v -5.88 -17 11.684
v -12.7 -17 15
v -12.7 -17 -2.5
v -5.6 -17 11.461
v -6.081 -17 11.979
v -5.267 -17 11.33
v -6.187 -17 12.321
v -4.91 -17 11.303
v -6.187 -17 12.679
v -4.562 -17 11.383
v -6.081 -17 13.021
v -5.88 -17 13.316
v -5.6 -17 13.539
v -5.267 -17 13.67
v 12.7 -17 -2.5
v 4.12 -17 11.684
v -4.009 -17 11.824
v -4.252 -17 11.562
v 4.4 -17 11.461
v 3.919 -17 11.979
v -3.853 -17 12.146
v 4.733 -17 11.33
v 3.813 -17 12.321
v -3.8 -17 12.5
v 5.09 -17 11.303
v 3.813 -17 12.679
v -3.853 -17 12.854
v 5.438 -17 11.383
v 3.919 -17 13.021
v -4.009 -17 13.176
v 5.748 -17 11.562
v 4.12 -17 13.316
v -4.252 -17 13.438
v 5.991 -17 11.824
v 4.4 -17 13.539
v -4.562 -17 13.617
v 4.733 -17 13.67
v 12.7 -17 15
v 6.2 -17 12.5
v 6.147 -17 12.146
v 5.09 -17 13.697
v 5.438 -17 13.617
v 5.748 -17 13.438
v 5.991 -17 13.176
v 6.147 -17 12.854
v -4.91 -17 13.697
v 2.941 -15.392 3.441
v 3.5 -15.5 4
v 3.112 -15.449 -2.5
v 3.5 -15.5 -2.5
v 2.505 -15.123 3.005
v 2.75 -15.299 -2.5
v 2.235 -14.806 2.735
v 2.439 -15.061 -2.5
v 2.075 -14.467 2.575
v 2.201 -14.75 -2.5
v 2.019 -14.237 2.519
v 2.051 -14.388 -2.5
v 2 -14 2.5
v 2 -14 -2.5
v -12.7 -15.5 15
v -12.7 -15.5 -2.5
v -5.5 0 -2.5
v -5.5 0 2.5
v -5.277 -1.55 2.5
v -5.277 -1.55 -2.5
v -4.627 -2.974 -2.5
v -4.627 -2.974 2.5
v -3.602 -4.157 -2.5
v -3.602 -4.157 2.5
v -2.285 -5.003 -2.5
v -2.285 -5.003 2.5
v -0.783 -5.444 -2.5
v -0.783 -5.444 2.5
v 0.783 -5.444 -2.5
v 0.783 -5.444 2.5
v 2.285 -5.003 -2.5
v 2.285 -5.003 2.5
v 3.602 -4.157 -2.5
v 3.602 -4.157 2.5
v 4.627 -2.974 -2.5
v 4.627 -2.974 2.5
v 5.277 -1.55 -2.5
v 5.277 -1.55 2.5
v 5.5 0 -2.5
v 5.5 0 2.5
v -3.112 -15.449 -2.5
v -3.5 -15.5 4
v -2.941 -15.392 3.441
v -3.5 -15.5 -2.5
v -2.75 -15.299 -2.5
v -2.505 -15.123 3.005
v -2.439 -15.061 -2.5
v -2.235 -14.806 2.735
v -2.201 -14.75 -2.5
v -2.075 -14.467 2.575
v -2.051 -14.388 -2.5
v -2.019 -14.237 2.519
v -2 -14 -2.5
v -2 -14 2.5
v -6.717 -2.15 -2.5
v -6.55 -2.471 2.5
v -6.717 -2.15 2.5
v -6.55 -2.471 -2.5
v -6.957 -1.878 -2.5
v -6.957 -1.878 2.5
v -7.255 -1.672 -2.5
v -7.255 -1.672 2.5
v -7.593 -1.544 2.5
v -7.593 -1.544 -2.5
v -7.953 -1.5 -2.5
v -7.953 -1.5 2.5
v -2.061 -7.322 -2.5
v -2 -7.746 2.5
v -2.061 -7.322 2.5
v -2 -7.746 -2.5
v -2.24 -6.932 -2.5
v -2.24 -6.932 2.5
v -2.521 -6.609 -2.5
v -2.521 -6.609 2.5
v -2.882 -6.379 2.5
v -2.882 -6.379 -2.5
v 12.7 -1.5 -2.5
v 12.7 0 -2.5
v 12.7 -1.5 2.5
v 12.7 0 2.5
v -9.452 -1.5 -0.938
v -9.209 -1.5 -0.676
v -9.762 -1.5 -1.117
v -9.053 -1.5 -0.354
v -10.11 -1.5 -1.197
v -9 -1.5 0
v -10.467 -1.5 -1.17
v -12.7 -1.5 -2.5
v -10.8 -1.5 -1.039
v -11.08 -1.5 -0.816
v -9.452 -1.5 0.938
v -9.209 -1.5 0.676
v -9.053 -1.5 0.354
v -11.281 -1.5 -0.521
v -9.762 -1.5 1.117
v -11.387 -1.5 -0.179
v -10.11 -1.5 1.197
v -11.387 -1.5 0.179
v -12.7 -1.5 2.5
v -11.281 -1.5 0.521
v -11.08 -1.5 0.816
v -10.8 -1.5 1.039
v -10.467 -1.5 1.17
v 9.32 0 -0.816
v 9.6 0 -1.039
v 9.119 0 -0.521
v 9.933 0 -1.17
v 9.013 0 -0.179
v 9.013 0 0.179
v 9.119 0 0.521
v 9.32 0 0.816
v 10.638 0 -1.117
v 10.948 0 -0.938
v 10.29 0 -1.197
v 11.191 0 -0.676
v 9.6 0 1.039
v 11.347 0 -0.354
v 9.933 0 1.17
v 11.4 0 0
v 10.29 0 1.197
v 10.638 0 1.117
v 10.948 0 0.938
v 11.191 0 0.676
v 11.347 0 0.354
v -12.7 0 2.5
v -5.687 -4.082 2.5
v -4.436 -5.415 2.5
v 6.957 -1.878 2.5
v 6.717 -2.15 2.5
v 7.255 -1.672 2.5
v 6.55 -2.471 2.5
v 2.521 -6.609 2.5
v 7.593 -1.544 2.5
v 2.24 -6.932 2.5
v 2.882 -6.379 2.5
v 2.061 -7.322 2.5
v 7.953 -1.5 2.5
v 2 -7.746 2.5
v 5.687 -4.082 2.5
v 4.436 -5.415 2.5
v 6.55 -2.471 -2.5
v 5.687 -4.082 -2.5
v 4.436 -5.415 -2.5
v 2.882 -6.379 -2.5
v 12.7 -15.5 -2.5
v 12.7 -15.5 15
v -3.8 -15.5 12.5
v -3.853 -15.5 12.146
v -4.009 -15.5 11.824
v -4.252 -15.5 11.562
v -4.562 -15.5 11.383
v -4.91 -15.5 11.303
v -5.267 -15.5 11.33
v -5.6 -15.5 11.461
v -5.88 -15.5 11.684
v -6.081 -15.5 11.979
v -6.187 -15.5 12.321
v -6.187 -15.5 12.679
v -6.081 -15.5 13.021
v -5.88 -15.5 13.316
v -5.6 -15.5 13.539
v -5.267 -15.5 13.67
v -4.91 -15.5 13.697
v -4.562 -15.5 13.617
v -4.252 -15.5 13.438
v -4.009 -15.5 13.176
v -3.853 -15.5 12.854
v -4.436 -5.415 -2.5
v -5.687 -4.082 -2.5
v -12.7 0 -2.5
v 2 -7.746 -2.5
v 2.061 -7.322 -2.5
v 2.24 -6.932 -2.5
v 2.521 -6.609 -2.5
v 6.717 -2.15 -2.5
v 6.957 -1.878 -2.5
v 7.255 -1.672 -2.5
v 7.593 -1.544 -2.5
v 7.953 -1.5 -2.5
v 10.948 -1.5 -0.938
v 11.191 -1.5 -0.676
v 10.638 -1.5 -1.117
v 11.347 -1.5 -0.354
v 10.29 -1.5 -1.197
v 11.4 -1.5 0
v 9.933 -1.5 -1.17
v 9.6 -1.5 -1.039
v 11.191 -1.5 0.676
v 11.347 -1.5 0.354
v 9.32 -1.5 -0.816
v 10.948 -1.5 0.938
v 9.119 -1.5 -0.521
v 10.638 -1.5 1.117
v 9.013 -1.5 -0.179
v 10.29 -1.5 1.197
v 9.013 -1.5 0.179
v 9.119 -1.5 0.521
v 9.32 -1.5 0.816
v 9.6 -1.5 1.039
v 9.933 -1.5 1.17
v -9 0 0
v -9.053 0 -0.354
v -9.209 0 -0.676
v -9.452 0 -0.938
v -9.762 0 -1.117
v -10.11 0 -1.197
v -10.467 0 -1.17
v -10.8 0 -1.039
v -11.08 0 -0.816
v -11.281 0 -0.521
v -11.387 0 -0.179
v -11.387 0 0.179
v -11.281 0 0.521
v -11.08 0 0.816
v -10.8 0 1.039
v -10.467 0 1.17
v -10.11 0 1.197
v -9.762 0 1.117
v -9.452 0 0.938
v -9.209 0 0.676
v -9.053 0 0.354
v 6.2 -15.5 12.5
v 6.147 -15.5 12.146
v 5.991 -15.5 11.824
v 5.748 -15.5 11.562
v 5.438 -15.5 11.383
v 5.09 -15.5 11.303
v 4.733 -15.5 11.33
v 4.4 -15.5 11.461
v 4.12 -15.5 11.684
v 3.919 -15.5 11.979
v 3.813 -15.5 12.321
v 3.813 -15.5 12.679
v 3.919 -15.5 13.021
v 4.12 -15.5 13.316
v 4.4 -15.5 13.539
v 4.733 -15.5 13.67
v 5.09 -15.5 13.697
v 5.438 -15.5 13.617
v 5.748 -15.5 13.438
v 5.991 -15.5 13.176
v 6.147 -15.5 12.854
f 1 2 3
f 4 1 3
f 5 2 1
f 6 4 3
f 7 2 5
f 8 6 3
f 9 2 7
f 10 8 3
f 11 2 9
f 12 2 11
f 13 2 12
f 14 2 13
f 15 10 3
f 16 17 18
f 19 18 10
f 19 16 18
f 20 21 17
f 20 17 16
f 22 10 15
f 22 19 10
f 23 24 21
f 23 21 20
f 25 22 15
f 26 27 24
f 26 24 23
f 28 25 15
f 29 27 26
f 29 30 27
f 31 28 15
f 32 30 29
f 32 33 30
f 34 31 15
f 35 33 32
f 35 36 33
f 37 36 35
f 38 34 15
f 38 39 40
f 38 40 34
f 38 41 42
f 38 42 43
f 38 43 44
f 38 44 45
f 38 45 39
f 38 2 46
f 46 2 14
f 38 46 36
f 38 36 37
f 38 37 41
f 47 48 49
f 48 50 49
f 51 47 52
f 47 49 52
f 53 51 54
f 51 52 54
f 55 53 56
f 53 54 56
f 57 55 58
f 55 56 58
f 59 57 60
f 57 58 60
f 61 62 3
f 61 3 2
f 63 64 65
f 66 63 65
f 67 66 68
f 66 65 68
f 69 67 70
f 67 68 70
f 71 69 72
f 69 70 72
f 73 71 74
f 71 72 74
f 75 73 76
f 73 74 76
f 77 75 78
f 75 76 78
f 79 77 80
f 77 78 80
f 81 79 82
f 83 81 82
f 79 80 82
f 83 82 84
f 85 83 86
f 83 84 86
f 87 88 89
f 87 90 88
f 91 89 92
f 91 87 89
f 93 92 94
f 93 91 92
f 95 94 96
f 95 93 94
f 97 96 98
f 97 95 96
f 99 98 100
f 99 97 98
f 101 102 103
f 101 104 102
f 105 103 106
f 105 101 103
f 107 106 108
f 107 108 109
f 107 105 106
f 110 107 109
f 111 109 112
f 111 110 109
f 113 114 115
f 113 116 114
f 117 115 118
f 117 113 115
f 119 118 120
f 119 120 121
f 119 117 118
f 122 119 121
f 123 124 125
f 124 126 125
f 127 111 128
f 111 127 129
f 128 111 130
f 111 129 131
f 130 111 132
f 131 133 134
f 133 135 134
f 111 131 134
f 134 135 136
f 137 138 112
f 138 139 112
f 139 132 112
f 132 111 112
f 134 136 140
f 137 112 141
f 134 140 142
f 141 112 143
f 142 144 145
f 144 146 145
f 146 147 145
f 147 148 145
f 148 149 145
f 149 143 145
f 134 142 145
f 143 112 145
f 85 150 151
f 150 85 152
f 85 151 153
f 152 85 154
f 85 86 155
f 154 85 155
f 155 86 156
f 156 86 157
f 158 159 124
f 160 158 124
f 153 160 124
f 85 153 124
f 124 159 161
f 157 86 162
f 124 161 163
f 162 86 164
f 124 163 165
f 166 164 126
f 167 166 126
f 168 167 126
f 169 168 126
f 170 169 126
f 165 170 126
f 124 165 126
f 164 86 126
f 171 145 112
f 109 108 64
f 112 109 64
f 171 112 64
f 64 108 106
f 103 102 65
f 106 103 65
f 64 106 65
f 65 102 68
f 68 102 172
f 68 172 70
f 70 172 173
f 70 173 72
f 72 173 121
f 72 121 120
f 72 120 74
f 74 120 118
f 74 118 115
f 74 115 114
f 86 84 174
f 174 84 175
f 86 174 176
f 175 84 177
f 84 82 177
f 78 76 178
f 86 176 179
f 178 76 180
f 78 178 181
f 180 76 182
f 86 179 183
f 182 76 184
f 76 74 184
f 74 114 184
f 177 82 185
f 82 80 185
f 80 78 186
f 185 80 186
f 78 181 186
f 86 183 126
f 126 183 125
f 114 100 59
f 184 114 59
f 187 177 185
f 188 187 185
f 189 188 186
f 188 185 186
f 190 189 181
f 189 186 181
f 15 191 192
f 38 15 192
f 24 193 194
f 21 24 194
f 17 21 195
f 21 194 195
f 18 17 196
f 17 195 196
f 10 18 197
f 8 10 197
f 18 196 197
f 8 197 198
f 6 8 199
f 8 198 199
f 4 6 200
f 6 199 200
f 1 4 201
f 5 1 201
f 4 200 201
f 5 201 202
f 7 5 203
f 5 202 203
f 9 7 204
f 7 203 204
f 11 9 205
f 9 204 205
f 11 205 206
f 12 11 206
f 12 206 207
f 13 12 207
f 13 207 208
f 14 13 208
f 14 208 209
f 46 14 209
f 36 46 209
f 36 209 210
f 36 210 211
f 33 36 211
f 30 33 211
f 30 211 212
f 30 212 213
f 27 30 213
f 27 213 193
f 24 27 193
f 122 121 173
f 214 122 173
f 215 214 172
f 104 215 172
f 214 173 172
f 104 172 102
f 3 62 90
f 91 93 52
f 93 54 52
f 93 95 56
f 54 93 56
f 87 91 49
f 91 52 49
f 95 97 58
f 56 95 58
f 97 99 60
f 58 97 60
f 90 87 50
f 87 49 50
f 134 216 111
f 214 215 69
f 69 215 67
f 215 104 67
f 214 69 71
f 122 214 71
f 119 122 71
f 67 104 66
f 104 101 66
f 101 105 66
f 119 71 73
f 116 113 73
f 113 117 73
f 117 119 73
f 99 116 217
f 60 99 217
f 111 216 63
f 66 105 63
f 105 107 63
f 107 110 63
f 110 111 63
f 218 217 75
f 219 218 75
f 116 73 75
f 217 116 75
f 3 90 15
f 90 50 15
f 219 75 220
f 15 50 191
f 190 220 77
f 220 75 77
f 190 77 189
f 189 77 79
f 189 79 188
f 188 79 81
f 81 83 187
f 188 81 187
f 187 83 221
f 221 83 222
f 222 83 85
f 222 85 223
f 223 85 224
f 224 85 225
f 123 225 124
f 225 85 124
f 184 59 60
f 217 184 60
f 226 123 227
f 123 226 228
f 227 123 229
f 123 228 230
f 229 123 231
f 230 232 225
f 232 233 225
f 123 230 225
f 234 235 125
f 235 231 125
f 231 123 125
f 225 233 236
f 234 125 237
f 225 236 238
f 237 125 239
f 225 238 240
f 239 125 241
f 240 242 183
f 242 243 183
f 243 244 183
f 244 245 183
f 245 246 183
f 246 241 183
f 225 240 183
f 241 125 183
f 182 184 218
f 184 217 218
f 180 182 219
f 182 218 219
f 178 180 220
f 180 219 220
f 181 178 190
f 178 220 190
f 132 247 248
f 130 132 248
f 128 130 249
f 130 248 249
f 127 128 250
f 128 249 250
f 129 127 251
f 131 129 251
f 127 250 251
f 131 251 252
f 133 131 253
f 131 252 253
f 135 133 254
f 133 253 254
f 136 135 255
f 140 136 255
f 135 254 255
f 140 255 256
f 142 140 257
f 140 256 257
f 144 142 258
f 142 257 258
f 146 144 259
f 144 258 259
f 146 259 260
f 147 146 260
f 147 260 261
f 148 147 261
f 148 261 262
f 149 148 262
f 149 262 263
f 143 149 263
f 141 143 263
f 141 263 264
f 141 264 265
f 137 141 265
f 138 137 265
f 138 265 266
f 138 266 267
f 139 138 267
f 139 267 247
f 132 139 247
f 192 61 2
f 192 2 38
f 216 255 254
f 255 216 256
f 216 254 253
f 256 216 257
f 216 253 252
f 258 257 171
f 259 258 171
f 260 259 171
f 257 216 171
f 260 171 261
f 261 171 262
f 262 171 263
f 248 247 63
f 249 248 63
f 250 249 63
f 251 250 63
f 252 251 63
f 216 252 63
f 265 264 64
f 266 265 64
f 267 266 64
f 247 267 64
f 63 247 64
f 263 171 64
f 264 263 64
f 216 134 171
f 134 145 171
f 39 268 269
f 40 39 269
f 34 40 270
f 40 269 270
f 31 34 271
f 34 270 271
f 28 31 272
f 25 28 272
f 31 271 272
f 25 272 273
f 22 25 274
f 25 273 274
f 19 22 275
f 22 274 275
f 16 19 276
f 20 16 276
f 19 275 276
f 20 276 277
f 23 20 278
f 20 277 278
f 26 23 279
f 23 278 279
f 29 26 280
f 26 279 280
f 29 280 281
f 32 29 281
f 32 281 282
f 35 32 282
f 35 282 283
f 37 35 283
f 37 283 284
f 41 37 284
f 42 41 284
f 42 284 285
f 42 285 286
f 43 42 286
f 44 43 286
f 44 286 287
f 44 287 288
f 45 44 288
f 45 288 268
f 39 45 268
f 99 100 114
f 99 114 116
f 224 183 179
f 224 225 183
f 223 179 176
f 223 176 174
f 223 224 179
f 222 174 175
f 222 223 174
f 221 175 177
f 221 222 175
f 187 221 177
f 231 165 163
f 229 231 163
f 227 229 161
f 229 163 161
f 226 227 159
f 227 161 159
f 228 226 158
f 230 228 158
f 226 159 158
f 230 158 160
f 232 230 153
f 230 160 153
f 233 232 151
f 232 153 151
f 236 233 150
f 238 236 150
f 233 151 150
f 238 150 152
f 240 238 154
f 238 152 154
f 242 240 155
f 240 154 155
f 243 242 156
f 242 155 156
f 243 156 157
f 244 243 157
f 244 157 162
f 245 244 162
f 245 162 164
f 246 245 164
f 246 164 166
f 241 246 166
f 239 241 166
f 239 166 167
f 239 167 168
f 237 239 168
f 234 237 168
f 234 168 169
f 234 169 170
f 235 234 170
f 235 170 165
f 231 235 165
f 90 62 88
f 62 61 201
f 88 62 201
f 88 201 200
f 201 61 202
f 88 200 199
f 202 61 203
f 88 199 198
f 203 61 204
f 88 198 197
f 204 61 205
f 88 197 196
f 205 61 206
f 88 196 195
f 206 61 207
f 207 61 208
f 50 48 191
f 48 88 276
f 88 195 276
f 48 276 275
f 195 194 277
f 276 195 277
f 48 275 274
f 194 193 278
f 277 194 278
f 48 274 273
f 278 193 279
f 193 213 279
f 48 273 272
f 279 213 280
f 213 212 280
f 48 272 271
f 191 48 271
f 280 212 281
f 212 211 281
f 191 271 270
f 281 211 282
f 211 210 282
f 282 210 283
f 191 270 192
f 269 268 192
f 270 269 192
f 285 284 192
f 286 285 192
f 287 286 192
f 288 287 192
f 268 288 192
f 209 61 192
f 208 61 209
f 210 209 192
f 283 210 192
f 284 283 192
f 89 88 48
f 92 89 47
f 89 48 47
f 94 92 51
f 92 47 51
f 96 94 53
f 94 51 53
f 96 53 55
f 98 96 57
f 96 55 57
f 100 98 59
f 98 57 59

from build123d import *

# Parameters (mm, degrees)
BOSS_EXTRUDE1_DEPTH = 2.5
SKETCH2_R           = 1.2
CUT_EXTRUDE1_DEPTH  = 8
BOSS_EXTRUDE2_START = -15.5
SKETCH3_W           = 4
SKETCH3_H           = 5
BOSS_EXTRUDE2_DEPTH = 8.791796
SKETCH4_W           = 25.4
SKETCH4_H           = 17.5
BOSS_EXTRUDE3_DEPTH = 1.5
FILLET1_R           = 1.5
SKETCH5_R           = 1.2
CUT_EXTRUDE2_DEPTH  = 18


with BuildPart() as part:
    # Sketch1 → Boss-Extrude1 (new body, symmetric)
    with BuildSketch(Plane.XY):
        with BuildLine():
            Line((5.5, 0), (12.7, 0))
            Line((12.7, 0), (12.7, -1.5))
            Line((12.7, -1.5), (6.837397166, -1.5))
            ThreePointArc((6.837397166, -1.5), (0, -7), (-6.837397166, -1.5))
            Line((-6.837397166, -1.5), (-12.7, -1.5))
            Line((-12.7, -1.5), (-12.7, 0))
            Line((-12.7, 0), (-5.5, 0))
            ThreePointArc((-5.5, 0), (0, -5.5), (5.5, 0))
        make_face()
    extrude(amount=BOSS_EXTRUDE1_DEPTH, both=True)

    # Sketch2 → Cut-Extrude1 (cut, through all)
    with BuildSketch(Plane(origin=(0, 0, 0), x_dir=(1, 0, 0), z_dir=(0, 1, 0))):
        with Locations((-10.2, 0)):
            Circle(SKETCH2_R)
        with Locations((10.2, 0)):
            Circle(SKETCH2_R)
    extrude(amount=-CUT_EXTRUDE1_DEPTH, mode=Mode.SUBTRACT)

    # Sketch3 → Boss-Extrude2 (add)
    with BuildSketch(Plane(origin=(0, 0, 0), x_dir=(1, 0, 0), z_dir=(0, 1, 0)).offset(BOSS_EXTRUDE2_START)):
        Rectangle(SKETCH3_W, SKETCH3_H)
    extrude(amount=BOSS_EXTRUDE2_DEPTH)

    # Sketch4 → Boss-Extrude3 (add)
    with BuildSketch(Plane.XZ.offset(15.5)):
        with Locations((0, 6.25)):
            Rectangle(SKETCH4_W, SKETCH4_H)
    extrude(amount=BOSS_EXTRUDE3_DEPTH)

    # Fillet1
    fillet1_edges = [part.edges().sort_by_distance(p)[0] for p in [
        (6.837397166, -1.5, 0),
        (-6.837397166, -1.5, 0),
        (2, -15.5, 0),
        (-2, -15.5, 0),
        (0, -15.5, 2.5),
        (2, -6.708204, 0),
        (-2, -6.708204, 0),
    ]]
    fillet(fillet1_edges, radius=FILLET1_R)

    # Sketch5 → Cut-Extrude2 (cut, through all)
    with BuildSketch(Plane(origin=(0, 0, 0), x_dir=(1, 0, 0), z_dir=(0, 1, 0))):
        with Locations((-5, -12.5)):
            Circle(SKETCH5_R)
        with Locations((5, -12.5)):
            Circle(SKETCH5_R)
    extrude(amount=-CUT_EXTRUDE2_DEPTH, mode=Mode.SUBTRACT)


solid = part.part
